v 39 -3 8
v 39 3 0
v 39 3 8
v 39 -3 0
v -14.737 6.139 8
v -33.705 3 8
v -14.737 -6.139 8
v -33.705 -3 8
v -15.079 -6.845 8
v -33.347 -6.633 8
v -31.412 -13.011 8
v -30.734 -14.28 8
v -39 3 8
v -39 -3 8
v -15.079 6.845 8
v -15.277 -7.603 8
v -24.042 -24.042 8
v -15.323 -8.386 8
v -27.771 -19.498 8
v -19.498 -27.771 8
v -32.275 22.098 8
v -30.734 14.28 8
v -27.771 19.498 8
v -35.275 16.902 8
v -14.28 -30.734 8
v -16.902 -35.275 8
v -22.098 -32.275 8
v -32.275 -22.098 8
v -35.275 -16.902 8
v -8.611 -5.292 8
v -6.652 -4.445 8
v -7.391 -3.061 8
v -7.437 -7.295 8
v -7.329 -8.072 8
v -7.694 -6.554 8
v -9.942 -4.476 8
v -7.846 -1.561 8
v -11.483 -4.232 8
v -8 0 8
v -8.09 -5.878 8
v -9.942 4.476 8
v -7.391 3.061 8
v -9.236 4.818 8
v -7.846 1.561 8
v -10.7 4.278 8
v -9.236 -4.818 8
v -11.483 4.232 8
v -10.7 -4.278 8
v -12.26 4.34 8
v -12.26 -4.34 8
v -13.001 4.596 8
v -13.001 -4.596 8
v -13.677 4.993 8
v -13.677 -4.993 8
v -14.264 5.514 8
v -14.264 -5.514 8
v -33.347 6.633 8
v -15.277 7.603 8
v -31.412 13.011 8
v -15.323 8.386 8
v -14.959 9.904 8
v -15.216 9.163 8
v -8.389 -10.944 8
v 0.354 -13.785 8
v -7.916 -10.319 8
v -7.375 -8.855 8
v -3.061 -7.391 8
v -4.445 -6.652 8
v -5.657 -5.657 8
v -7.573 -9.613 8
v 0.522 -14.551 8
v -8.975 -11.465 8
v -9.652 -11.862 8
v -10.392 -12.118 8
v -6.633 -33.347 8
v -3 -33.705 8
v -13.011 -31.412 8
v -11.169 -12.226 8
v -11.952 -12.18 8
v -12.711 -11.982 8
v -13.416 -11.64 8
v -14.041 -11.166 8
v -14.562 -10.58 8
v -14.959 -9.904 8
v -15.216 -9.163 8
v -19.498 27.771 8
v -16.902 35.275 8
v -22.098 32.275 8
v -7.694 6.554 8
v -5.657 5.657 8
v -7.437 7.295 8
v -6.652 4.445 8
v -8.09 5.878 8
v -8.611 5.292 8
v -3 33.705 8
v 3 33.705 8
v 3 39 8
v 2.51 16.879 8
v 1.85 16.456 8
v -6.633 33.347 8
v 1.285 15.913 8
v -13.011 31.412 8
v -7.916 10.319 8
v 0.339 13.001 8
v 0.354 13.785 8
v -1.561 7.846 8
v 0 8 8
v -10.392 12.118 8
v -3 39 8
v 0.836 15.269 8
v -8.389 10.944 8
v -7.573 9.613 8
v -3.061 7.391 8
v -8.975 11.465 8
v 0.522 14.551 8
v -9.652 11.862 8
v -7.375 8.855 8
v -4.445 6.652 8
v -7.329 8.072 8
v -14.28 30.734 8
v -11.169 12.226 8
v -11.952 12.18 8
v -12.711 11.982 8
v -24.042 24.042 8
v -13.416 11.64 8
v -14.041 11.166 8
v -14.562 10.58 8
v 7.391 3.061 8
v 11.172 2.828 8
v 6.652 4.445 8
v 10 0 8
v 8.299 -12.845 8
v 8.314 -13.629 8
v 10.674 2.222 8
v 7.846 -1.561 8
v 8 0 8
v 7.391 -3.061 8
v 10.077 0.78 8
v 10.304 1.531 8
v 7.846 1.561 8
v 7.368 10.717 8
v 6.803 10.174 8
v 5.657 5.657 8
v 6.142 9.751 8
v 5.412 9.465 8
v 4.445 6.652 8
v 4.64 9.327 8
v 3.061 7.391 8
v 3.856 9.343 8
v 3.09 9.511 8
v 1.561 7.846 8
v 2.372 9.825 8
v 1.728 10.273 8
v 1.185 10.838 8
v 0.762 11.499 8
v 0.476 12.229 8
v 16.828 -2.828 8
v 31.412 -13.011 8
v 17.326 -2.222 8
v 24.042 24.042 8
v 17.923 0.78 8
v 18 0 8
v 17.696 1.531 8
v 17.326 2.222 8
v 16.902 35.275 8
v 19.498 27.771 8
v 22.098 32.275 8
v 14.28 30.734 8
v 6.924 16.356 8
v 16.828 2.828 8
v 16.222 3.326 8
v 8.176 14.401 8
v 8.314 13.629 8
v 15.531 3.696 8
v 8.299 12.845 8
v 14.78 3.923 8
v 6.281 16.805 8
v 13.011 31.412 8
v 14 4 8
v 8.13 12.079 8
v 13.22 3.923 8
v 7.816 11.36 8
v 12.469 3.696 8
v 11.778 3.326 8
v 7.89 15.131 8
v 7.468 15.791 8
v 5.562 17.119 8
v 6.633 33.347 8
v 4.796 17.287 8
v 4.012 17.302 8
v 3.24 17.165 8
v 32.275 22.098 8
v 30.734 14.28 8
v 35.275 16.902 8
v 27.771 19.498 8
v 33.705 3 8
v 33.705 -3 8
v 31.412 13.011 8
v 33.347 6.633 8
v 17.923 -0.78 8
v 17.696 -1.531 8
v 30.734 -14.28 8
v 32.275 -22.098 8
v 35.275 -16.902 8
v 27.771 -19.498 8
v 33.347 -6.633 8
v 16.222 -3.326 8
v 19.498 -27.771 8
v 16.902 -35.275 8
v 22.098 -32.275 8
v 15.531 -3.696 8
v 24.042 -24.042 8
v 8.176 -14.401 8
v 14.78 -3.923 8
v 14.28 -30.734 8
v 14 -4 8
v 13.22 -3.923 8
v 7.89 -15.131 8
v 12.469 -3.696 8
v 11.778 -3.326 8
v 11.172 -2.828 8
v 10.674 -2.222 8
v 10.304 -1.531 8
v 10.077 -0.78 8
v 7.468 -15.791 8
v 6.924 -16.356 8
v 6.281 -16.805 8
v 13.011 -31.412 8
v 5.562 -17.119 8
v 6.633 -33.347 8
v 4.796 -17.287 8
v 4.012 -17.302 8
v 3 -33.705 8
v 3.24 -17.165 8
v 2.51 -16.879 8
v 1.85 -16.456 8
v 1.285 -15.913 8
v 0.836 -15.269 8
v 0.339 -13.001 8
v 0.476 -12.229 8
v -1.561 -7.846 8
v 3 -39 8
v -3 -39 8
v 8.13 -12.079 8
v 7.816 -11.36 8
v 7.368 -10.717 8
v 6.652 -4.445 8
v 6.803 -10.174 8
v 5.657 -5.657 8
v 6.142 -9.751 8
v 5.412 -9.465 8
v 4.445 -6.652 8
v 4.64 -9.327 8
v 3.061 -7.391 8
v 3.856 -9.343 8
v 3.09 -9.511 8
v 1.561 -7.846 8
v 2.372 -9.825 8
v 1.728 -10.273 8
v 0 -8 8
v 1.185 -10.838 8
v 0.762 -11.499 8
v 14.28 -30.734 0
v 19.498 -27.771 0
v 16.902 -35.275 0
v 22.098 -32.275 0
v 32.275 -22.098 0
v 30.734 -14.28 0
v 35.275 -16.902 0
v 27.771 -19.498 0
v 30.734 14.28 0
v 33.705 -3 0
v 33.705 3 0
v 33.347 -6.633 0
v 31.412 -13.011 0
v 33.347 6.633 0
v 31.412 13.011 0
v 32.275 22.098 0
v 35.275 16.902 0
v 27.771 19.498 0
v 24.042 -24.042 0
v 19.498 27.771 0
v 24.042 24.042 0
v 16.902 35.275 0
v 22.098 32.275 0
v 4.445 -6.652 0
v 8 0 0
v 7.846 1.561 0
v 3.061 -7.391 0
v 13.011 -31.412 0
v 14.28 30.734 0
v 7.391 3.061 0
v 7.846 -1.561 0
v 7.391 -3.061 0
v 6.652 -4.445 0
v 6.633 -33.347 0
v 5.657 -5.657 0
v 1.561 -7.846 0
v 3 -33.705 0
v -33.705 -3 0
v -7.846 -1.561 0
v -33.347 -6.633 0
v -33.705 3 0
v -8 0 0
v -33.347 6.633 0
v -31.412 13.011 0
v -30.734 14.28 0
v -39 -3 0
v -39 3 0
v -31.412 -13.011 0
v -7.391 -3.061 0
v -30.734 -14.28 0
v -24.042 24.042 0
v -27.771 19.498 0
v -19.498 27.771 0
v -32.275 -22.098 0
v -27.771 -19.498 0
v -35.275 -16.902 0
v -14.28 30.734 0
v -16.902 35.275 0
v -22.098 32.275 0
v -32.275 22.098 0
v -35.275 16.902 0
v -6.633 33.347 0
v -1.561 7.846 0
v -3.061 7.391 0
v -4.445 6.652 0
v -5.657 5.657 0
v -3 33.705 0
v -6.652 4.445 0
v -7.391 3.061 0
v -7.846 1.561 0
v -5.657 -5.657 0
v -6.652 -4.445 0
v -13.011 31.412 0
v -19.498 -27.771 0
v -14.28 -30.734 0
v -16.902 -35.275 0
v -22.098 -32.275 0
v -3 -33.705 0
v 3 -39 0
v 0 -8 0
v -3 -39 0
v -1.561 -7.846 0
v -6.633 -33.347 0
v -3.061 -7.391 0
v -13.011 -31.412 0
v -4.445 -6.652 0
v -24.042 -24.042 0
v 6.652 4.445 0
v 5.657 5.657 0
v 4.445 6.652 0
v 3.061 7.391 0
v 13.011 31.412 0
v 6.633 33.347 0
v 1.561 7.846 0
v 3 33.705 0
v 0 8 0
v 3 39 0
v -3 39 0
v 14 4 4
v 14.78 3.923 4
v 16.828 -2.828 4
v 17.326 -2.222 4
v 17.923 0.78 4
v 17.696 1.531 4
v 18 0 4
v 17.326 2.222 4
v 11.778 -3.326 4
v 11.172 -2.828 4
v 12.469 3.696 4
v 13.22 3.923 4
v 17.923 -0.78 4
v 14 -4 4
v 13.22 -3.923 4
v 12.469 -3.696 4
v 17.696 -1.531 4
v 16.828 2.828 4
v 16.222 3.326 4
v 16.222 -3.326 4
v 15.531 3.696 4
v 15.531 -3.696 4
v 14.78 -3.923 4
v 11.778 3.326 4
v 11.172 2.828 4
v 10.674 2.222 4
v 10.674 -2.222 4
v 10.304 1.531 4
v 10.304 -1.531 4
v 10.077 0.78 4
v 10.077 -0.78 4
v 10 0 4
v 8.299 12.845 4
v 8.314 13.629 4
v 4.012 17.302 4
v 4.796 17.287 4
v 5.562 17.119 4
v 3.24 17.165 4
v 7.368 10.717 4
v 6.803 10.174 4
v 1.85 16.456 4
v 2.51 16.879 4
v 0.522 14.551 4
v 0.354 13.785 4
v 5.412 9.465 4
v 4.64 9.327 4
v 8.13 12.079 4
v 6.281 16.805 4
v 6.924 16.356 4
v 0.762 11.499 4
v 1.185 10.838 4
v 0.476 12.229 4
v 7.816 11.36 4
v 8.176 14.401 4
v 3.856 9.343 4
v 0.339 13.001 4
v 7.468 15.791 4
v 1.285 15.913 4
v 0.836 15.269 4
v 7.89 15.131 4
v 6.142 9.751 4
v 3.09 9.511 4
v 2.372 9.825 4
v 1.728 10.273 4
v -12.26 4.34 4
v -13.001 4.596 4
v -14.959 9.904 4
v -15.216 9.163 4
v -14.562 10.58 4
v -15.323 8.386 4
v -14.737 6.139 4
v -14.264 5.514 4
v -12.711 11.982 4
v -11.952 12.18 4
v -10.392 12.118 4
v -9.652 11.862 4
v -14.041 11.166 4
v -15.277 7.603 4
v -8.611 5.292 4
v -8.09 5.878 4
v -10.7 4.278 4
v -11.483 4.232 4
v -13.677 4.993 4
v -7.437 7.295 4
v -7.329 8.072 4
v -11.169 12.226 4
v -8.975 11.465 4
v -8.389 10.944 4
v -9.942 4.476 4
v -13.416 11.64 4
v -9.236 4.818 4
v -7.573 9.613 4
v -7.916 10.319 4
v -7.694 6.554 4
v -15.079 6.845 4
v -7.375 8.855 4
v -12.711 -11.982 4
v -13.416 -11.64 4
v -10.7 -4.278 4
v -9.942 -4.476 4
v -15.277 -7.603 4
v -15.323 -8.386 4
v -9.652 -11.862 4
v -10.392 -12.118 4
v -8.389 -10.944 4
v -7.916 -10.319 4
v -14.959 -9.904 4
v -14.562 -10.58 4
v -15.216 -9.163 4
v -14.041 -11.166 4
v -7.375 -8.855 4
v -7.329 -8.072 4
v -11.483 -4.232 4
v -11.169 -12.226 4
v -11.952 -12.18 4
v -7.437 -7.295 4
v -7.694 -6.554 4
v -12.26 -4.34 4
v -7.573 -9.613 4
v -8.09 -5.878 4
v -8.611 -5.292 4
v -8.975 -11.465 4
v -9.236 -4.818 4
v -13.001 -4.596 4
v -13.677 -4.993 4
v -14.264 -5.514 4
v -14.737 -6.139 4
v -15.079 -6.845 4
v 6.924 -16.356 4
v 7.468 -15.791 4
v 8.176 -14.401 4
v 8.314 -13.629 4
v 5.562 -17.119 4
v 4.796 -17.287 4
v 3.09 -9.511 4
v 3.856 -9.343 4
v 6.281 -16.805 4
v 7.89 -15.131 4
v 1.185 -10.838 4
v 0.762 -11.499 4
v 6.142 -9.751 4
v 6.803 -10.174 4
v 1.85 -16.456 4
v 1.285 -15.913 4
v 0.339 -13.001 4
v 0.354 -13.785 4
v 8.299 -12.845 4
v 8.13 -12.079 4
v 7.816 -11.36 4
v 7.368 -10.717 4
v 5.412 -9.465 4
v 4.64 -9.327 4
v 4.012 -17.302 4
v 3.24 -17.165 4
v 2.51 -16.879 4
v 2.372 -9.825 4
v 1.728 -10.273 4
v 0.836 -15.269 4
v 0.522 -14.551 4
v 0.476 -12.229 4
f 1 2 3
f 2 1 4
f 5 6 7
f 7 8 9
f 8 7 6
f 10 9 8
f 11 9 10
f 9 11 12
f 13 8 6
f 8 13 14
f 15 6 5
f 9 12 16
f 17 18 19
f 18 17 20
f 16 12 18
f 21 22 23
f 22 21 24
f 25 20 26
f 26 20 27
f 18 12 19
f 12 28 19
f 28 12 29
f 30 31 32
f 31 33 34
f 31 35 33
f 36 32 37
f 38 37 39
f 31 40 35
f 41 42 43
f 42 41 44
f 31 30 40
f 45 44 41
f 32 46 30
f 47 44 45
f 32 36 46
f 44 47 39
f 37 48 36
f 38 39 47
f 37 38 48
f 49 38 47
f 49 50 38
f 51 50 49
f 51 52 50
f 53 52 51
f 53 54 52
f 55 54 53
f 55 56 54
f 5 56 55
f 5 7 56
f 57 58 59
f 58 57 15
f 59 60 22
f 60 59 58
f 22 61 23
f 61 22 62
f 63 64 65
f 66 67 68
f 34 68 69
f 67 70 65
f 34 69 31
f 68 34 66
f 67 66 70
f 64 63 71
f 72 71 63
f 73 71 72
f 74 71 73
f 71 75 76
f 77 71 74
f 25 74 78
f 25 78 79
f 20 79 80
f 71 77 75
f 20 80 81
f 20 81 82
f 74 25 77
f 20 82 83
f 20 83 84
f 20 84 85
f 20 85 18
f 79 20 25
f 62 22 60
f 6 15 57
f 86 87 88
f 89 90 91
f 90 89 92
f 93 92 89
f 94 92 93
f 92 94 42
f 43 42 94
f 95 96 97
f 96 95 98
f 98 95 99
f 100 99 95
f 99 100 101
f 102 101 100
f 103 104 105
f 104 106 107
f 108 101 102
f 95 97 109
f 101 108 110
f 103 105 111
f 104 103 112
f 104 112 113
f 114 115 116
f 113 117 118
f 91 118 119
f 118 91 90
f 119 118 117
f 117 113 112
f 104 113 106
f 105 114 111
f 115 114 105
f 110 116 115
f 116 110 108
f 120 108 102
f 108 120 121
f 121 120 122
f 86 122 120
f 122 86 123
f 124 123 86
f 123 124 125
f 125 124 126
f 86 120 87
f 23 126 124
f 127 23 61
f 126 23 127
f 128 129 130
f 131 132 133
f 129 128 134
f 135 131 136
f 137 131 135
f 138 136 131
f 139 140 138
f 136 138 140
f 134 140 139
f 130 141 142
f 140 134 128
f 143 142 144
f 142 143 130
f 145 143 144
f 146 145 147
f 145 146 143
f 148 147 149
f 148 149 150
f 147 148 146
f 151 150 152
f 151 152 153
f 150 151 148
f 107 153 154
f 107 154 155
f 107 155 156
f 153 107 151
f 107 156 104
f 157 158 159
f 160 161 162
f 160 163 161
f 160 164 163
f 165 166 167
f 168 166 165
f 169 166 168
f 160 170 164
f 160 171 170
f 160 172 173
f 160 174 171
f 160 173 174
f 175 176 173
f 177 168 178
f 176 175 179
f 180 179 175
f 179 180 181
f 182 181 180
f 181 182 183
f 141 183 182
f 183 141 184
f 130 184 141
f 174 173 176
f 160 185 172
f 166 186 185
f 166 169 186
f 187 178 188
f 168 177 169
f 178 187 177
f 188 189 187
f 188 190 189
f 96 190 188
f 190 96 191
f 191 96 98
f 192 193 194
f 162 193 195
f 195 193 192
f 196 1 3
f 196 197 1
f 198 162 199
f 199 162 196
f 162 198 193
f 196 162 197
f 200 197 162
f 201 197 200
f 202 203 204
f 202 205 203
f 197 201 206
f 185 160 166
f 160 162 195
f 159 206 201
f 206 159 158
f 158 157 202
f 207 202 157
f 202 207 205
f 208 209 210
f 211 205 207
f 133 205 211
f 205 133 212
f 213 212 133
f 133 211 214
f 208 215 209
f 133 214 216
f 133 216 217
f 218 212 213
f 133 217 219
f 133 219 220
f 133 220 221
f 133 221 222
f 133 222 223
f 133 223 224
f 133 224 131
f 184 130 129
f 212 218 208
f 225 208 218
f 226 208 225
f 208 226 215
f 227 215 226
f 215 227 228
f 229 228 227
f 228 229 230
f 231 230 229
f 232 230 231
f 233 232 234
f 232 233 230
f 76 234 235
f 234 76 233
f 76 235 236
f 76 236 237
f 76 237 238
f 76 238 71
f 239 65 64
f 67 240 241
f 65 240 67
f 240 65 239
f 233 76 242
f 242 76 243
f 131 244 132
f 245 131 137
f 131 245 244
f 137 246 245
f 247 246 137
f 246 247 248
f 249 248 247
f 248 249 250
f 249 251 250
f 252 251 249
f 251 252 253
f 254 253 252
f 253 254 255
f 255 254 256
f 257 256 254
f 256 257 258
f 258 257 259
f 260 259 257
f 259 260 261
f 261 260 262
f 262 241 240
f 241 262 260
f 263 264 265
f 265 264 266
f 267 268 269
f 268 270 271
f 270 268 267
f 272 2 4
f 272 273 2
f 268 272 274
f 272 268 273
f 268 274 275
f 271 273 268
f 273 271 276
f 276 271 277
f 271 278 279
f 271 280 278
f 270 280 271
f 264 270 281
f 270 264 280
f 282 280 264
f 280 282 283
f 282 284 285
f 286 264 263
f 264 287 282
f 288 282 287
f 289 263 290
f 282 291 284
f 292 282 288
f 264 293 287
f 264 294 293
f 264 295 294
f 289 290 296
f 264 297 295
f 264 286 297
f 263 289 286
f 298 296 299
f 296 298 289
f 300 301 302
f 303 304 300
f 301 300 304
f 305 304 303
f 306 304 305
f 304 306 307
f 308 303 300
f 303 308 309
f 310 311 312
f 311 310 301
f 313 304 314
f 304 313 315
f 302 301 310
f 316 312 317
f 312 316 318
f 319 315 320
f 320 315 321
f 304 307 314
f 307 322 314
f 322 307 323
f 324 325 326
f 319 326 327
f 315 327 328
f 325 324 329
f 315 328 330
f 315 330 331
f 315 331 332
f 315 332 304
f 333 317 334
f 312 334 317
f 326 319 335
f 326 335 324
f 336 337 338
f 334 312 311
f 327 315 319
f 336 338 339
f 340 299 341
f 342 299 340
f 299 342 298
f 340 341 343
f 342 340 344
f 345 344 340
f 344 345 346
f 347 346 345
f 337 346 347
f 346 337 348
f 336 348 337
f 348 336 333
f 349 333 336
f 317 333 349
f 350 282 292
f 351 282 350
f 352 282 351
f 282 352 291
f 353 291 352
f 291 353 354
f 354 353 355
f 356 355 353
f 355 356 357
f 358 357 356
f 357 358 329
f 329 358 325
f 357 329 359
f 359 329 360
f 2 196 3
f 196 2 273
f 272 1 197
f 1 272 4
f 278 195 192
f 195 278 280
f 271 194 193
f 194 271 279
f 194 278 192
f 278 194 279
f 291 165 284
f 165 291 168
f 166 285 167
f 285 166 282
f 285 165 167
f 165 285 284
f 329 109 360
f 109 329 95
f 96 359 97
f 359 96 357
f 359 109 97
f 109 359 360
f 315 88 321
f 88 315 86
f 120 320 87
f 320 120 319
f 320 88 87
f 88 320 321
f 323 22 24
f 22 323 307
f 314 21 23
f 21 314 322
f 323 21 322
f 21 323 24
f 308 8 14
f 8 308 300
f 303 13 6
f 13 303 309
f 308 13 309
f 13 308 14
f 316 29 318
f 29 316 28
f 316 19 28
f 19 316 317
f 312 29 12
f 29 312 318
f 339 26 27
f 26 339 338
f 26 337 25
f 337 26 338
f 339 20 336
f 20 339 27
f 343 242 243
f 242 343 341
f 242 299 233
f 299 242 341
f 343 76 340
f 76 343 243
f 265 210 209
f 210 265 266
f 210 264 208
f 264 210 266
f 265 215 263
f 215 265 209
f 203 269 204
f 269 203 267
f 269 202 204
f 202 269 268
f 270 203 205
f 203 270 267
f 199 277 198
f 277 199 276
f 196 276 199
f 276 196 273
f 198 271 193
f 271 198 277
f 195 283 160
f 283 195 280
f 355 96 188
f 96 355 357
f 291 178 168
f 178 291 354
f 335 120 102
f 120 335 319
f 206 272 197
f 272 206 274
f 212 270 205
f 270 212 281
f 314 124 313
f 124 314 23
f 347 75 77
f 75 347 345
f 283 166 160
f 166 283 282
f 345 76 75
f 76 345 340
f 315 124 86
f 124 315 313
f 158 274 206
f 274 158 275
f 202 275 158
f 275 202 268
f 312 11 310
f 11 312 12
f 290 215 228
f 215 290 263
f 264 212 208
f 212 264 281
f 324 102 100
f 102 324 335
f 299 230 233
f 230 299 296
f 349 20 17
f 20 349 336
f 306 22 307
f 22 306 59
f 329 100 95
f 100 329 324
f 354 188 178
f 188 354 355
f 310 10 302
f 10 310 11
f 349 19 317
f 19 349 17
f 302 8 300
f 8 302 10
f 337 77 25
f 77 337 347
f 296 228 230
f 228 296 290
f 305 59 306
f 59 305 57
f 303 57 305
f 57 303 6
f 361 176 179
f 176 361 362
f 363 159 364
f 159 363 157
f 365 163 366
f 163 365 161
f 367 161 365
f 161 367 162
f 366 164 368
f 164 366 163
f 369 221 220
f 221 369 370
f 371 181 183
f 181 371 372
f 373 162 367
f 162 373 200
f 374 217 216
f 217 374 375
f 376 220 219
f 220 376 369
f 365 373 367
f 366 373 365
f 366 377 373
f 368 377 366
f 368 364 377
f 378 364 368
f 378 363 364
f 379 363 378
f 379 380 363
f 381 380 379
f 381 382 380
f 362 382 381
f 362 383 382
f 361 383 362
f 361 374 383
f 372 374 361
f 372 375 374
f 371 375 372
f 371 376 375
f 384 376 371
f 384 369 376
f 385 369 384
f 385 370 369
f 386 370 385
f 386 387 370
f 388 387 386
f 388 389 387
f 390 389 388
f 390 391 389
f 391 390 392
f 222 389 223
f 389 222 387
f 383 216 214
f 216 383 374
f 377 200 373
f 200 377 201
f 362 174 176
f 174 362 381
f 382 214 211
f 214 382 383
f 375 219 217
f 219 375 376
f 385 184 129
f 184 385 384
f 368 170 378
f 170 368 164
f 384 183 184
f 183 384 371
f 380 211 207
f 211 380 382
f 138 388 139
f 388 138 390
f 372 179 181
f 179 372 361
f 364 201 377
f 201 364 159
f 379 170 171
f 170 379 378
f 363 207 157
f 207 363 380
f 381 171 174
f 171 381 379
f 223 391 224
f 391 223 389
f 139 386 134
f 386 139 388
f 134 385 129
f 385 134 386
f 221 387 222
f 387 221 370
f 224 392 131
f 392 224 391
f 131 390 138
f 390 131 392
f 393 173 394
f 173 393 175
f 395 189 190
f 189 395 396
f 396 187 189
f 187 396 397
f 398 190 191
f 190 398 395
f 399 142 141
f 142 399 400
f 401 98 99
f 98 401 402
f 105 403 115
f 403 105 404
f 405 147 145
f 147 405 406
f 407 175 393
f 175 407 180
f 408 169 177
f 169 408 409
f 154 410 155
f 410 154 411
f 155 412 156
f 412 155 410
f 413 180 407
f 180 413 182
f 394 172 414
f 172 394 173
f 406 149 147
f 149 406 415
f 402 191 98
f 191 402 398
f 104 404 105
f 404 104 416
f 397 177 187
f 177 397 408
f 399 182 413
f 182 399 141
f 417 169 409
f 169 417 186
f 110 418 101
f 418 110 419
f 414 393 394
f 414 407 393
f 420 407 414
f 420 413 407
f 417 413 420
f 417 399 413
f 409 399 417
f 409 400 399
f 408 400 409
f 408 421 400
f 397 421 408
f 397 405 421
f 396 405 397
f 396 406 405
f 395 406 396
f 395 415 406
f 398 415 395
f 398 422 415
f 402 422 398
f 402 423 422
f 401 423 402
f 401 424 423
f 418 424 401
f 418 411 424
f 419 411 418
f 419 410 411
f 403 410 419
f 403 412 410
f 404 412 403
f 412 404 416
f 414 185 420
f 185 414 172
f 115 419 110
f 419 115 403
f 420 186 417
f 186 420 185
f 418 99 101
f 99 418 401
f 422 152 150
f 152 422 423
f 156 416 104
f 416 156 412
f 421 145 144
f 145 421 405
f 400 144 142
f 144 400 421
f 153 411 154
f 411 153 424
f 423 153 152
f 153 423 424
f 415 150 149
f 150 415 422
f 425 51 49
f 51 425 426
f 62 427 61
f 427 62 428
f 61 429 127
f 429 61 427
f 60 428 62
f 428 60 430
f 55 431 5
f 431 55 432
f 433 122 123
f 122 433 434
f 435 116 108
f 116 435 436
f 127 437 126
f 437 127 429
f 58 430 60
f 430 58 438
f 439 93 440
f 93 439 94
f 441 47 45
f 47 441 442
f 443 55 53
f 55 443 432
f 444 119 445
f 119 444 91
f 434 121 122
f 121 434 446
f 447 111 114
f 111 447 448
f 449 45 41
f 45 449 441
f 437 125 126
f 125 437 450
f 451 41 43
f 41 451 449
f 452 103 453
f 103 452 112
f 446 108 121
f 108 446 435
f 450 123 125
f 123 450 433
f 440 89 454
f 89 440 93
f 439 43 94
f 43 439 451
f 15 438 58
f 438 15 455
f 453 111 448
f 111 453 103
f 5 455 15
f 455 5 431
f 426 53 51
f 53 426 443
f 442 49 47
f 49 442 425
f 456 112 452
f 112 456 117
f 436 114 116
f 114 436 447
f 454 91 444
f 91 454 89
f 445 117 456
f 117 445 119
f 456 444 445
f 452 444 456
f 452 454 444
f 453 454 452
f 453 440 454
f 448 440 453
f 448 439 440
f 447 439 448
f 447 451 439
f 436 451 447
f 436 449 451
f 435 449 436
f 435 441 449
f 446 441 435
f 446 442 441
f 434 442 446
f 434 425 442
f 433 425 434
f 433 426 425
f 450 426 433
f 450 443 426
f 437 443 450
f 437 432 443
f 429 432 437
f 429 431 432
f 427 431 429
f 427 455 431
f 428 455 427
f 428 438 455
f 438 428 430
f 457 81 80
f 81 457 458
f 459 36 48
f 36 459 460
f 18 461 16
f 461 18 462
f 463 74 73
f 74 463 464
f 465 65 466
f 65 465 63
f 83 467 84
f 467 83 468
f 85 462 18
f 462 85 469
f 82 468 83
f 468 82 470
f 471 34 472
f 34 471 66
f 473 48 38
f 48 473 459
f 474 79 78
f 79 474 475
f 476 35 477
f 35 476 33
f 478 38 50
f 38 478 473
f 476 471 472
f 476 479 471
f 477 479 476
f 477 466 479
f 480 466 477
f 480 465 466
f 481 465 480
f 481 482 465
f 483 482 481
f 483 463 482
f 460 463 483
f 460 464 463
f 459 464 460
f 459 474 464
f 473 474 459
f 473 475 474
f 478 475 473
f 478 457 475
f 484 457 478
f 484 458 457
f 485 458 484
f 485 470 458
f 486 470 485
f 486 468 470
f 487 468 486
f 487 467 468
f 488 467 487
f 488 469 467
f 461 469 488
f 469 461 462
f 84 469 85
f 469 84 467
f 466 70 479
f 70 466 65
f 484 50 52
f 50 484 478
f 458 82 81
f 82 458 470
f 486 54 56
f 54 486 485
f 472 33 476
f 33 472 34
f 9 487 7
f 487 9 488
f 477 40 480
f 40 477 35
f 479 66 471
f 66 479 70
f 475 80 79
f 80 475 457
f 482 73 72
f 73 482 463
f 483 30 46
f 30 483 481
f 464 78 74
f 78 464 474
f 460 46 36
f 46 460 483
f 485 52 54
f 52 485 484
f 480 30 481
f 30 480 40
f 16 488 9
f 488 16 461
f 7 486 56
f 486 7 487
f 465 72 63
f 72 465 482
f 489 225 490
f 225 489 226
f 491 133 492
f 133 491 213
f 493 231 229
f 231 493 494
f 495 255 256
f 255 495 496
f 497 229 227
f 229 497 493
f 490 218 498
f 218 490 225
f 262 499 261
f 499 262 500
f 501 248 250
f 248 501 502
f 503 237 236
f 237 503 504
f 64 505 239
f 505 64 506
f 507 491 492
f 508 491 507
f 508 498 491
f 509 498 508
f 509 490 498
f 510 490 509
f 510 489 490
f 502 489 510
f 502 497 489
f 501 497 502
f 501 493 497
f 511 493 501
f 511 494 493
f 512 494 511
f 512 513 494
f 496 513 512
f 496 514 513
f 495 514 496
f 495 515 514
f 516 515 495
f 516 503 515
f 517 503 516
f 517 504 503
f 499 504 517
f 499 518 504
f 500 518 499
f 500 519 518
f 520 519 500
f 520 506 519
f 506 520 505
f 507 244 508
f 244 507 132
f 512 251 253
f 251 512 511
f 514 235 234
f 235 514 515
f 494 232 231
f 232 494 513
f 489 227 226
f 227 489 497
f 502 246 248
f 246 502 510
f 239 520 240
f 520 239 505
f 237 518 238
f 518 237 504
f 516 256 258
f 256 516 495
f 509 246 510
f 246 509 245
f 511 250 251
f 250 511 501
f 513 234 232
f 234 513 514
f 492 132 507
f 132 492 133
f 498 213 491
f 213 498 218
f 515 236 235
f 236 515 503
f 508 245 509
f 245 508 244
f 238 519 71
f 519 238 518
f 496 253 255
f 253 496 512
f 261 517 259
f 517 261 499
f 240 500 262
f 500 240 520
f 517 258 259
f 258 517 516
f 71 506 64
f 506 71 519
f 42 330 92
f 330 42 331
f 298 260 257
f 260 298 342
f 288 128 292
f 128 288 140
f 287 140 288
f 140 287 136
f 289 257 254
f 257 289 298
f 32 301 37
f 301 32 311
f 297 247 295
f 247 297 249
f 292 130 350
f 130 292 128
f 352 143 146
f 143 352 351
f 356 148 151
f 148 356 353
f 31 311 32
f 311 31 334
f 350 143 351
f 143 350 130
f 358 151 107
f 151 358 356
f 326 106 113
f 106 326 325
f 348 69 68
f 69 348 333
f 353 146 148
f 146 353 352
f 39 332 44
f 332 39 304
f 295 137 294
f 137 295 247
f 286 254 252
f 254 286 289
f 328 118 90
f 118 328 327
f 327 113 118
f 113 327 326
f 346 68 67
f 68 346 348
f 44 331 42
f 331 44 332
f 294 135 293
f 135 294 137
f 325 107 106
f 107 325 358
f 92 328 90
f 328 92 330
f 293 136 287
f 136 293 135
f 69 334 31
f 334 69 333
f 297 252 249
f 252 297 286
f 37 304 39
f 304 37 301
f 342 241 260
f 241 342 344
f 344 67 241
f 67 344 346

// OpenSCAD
$fn = 32;

// ----------------------------------------------------------------------
// Spur blank: lightened gear blank
// ----------------------------------------------------------------------

// --- parameters (mm) ---
disc_r = 34;              // blank root radius
disc_t = 8;               // blank thickness
n_teeth = 12;             // stub tooth count
tooth_w = 6;              // tooth width at the root
tooth_h = 5;              // tooth height above the root
bore_r = 8;               // central bore radius
ring_r = 14;              // lightening pocket ring radius
pocket_r = 4;             // lightening pocket radius

out_r = disc_r + tooth_h;  // tip radius
bbox_x = 78.0;  // measured width over the teeth
bbox_y = 78.0;  // measured depth over the teeth

difference() {
union() {
  cylinder(r = disc_r, h = disc_t);
  for (i = [0 : n_teeth - 1])
    rotate([0, 0, i * 360 / n_teeth])
      translate([disc_r - 1, -tooth_w / 2, 0])
        cube([tooth_h + 1, tooth_w, disc_t]);
}
  translate([0, 0, -1]) cylinder(r = bore_r, h = disc_t + 2);
  for (i = [0 : 5])
    rotate([0, 0, i * 72])
      translate([ring_r, 0, disc_t - 4])
        cylinder(r = pocket_r, h = 5);
}
